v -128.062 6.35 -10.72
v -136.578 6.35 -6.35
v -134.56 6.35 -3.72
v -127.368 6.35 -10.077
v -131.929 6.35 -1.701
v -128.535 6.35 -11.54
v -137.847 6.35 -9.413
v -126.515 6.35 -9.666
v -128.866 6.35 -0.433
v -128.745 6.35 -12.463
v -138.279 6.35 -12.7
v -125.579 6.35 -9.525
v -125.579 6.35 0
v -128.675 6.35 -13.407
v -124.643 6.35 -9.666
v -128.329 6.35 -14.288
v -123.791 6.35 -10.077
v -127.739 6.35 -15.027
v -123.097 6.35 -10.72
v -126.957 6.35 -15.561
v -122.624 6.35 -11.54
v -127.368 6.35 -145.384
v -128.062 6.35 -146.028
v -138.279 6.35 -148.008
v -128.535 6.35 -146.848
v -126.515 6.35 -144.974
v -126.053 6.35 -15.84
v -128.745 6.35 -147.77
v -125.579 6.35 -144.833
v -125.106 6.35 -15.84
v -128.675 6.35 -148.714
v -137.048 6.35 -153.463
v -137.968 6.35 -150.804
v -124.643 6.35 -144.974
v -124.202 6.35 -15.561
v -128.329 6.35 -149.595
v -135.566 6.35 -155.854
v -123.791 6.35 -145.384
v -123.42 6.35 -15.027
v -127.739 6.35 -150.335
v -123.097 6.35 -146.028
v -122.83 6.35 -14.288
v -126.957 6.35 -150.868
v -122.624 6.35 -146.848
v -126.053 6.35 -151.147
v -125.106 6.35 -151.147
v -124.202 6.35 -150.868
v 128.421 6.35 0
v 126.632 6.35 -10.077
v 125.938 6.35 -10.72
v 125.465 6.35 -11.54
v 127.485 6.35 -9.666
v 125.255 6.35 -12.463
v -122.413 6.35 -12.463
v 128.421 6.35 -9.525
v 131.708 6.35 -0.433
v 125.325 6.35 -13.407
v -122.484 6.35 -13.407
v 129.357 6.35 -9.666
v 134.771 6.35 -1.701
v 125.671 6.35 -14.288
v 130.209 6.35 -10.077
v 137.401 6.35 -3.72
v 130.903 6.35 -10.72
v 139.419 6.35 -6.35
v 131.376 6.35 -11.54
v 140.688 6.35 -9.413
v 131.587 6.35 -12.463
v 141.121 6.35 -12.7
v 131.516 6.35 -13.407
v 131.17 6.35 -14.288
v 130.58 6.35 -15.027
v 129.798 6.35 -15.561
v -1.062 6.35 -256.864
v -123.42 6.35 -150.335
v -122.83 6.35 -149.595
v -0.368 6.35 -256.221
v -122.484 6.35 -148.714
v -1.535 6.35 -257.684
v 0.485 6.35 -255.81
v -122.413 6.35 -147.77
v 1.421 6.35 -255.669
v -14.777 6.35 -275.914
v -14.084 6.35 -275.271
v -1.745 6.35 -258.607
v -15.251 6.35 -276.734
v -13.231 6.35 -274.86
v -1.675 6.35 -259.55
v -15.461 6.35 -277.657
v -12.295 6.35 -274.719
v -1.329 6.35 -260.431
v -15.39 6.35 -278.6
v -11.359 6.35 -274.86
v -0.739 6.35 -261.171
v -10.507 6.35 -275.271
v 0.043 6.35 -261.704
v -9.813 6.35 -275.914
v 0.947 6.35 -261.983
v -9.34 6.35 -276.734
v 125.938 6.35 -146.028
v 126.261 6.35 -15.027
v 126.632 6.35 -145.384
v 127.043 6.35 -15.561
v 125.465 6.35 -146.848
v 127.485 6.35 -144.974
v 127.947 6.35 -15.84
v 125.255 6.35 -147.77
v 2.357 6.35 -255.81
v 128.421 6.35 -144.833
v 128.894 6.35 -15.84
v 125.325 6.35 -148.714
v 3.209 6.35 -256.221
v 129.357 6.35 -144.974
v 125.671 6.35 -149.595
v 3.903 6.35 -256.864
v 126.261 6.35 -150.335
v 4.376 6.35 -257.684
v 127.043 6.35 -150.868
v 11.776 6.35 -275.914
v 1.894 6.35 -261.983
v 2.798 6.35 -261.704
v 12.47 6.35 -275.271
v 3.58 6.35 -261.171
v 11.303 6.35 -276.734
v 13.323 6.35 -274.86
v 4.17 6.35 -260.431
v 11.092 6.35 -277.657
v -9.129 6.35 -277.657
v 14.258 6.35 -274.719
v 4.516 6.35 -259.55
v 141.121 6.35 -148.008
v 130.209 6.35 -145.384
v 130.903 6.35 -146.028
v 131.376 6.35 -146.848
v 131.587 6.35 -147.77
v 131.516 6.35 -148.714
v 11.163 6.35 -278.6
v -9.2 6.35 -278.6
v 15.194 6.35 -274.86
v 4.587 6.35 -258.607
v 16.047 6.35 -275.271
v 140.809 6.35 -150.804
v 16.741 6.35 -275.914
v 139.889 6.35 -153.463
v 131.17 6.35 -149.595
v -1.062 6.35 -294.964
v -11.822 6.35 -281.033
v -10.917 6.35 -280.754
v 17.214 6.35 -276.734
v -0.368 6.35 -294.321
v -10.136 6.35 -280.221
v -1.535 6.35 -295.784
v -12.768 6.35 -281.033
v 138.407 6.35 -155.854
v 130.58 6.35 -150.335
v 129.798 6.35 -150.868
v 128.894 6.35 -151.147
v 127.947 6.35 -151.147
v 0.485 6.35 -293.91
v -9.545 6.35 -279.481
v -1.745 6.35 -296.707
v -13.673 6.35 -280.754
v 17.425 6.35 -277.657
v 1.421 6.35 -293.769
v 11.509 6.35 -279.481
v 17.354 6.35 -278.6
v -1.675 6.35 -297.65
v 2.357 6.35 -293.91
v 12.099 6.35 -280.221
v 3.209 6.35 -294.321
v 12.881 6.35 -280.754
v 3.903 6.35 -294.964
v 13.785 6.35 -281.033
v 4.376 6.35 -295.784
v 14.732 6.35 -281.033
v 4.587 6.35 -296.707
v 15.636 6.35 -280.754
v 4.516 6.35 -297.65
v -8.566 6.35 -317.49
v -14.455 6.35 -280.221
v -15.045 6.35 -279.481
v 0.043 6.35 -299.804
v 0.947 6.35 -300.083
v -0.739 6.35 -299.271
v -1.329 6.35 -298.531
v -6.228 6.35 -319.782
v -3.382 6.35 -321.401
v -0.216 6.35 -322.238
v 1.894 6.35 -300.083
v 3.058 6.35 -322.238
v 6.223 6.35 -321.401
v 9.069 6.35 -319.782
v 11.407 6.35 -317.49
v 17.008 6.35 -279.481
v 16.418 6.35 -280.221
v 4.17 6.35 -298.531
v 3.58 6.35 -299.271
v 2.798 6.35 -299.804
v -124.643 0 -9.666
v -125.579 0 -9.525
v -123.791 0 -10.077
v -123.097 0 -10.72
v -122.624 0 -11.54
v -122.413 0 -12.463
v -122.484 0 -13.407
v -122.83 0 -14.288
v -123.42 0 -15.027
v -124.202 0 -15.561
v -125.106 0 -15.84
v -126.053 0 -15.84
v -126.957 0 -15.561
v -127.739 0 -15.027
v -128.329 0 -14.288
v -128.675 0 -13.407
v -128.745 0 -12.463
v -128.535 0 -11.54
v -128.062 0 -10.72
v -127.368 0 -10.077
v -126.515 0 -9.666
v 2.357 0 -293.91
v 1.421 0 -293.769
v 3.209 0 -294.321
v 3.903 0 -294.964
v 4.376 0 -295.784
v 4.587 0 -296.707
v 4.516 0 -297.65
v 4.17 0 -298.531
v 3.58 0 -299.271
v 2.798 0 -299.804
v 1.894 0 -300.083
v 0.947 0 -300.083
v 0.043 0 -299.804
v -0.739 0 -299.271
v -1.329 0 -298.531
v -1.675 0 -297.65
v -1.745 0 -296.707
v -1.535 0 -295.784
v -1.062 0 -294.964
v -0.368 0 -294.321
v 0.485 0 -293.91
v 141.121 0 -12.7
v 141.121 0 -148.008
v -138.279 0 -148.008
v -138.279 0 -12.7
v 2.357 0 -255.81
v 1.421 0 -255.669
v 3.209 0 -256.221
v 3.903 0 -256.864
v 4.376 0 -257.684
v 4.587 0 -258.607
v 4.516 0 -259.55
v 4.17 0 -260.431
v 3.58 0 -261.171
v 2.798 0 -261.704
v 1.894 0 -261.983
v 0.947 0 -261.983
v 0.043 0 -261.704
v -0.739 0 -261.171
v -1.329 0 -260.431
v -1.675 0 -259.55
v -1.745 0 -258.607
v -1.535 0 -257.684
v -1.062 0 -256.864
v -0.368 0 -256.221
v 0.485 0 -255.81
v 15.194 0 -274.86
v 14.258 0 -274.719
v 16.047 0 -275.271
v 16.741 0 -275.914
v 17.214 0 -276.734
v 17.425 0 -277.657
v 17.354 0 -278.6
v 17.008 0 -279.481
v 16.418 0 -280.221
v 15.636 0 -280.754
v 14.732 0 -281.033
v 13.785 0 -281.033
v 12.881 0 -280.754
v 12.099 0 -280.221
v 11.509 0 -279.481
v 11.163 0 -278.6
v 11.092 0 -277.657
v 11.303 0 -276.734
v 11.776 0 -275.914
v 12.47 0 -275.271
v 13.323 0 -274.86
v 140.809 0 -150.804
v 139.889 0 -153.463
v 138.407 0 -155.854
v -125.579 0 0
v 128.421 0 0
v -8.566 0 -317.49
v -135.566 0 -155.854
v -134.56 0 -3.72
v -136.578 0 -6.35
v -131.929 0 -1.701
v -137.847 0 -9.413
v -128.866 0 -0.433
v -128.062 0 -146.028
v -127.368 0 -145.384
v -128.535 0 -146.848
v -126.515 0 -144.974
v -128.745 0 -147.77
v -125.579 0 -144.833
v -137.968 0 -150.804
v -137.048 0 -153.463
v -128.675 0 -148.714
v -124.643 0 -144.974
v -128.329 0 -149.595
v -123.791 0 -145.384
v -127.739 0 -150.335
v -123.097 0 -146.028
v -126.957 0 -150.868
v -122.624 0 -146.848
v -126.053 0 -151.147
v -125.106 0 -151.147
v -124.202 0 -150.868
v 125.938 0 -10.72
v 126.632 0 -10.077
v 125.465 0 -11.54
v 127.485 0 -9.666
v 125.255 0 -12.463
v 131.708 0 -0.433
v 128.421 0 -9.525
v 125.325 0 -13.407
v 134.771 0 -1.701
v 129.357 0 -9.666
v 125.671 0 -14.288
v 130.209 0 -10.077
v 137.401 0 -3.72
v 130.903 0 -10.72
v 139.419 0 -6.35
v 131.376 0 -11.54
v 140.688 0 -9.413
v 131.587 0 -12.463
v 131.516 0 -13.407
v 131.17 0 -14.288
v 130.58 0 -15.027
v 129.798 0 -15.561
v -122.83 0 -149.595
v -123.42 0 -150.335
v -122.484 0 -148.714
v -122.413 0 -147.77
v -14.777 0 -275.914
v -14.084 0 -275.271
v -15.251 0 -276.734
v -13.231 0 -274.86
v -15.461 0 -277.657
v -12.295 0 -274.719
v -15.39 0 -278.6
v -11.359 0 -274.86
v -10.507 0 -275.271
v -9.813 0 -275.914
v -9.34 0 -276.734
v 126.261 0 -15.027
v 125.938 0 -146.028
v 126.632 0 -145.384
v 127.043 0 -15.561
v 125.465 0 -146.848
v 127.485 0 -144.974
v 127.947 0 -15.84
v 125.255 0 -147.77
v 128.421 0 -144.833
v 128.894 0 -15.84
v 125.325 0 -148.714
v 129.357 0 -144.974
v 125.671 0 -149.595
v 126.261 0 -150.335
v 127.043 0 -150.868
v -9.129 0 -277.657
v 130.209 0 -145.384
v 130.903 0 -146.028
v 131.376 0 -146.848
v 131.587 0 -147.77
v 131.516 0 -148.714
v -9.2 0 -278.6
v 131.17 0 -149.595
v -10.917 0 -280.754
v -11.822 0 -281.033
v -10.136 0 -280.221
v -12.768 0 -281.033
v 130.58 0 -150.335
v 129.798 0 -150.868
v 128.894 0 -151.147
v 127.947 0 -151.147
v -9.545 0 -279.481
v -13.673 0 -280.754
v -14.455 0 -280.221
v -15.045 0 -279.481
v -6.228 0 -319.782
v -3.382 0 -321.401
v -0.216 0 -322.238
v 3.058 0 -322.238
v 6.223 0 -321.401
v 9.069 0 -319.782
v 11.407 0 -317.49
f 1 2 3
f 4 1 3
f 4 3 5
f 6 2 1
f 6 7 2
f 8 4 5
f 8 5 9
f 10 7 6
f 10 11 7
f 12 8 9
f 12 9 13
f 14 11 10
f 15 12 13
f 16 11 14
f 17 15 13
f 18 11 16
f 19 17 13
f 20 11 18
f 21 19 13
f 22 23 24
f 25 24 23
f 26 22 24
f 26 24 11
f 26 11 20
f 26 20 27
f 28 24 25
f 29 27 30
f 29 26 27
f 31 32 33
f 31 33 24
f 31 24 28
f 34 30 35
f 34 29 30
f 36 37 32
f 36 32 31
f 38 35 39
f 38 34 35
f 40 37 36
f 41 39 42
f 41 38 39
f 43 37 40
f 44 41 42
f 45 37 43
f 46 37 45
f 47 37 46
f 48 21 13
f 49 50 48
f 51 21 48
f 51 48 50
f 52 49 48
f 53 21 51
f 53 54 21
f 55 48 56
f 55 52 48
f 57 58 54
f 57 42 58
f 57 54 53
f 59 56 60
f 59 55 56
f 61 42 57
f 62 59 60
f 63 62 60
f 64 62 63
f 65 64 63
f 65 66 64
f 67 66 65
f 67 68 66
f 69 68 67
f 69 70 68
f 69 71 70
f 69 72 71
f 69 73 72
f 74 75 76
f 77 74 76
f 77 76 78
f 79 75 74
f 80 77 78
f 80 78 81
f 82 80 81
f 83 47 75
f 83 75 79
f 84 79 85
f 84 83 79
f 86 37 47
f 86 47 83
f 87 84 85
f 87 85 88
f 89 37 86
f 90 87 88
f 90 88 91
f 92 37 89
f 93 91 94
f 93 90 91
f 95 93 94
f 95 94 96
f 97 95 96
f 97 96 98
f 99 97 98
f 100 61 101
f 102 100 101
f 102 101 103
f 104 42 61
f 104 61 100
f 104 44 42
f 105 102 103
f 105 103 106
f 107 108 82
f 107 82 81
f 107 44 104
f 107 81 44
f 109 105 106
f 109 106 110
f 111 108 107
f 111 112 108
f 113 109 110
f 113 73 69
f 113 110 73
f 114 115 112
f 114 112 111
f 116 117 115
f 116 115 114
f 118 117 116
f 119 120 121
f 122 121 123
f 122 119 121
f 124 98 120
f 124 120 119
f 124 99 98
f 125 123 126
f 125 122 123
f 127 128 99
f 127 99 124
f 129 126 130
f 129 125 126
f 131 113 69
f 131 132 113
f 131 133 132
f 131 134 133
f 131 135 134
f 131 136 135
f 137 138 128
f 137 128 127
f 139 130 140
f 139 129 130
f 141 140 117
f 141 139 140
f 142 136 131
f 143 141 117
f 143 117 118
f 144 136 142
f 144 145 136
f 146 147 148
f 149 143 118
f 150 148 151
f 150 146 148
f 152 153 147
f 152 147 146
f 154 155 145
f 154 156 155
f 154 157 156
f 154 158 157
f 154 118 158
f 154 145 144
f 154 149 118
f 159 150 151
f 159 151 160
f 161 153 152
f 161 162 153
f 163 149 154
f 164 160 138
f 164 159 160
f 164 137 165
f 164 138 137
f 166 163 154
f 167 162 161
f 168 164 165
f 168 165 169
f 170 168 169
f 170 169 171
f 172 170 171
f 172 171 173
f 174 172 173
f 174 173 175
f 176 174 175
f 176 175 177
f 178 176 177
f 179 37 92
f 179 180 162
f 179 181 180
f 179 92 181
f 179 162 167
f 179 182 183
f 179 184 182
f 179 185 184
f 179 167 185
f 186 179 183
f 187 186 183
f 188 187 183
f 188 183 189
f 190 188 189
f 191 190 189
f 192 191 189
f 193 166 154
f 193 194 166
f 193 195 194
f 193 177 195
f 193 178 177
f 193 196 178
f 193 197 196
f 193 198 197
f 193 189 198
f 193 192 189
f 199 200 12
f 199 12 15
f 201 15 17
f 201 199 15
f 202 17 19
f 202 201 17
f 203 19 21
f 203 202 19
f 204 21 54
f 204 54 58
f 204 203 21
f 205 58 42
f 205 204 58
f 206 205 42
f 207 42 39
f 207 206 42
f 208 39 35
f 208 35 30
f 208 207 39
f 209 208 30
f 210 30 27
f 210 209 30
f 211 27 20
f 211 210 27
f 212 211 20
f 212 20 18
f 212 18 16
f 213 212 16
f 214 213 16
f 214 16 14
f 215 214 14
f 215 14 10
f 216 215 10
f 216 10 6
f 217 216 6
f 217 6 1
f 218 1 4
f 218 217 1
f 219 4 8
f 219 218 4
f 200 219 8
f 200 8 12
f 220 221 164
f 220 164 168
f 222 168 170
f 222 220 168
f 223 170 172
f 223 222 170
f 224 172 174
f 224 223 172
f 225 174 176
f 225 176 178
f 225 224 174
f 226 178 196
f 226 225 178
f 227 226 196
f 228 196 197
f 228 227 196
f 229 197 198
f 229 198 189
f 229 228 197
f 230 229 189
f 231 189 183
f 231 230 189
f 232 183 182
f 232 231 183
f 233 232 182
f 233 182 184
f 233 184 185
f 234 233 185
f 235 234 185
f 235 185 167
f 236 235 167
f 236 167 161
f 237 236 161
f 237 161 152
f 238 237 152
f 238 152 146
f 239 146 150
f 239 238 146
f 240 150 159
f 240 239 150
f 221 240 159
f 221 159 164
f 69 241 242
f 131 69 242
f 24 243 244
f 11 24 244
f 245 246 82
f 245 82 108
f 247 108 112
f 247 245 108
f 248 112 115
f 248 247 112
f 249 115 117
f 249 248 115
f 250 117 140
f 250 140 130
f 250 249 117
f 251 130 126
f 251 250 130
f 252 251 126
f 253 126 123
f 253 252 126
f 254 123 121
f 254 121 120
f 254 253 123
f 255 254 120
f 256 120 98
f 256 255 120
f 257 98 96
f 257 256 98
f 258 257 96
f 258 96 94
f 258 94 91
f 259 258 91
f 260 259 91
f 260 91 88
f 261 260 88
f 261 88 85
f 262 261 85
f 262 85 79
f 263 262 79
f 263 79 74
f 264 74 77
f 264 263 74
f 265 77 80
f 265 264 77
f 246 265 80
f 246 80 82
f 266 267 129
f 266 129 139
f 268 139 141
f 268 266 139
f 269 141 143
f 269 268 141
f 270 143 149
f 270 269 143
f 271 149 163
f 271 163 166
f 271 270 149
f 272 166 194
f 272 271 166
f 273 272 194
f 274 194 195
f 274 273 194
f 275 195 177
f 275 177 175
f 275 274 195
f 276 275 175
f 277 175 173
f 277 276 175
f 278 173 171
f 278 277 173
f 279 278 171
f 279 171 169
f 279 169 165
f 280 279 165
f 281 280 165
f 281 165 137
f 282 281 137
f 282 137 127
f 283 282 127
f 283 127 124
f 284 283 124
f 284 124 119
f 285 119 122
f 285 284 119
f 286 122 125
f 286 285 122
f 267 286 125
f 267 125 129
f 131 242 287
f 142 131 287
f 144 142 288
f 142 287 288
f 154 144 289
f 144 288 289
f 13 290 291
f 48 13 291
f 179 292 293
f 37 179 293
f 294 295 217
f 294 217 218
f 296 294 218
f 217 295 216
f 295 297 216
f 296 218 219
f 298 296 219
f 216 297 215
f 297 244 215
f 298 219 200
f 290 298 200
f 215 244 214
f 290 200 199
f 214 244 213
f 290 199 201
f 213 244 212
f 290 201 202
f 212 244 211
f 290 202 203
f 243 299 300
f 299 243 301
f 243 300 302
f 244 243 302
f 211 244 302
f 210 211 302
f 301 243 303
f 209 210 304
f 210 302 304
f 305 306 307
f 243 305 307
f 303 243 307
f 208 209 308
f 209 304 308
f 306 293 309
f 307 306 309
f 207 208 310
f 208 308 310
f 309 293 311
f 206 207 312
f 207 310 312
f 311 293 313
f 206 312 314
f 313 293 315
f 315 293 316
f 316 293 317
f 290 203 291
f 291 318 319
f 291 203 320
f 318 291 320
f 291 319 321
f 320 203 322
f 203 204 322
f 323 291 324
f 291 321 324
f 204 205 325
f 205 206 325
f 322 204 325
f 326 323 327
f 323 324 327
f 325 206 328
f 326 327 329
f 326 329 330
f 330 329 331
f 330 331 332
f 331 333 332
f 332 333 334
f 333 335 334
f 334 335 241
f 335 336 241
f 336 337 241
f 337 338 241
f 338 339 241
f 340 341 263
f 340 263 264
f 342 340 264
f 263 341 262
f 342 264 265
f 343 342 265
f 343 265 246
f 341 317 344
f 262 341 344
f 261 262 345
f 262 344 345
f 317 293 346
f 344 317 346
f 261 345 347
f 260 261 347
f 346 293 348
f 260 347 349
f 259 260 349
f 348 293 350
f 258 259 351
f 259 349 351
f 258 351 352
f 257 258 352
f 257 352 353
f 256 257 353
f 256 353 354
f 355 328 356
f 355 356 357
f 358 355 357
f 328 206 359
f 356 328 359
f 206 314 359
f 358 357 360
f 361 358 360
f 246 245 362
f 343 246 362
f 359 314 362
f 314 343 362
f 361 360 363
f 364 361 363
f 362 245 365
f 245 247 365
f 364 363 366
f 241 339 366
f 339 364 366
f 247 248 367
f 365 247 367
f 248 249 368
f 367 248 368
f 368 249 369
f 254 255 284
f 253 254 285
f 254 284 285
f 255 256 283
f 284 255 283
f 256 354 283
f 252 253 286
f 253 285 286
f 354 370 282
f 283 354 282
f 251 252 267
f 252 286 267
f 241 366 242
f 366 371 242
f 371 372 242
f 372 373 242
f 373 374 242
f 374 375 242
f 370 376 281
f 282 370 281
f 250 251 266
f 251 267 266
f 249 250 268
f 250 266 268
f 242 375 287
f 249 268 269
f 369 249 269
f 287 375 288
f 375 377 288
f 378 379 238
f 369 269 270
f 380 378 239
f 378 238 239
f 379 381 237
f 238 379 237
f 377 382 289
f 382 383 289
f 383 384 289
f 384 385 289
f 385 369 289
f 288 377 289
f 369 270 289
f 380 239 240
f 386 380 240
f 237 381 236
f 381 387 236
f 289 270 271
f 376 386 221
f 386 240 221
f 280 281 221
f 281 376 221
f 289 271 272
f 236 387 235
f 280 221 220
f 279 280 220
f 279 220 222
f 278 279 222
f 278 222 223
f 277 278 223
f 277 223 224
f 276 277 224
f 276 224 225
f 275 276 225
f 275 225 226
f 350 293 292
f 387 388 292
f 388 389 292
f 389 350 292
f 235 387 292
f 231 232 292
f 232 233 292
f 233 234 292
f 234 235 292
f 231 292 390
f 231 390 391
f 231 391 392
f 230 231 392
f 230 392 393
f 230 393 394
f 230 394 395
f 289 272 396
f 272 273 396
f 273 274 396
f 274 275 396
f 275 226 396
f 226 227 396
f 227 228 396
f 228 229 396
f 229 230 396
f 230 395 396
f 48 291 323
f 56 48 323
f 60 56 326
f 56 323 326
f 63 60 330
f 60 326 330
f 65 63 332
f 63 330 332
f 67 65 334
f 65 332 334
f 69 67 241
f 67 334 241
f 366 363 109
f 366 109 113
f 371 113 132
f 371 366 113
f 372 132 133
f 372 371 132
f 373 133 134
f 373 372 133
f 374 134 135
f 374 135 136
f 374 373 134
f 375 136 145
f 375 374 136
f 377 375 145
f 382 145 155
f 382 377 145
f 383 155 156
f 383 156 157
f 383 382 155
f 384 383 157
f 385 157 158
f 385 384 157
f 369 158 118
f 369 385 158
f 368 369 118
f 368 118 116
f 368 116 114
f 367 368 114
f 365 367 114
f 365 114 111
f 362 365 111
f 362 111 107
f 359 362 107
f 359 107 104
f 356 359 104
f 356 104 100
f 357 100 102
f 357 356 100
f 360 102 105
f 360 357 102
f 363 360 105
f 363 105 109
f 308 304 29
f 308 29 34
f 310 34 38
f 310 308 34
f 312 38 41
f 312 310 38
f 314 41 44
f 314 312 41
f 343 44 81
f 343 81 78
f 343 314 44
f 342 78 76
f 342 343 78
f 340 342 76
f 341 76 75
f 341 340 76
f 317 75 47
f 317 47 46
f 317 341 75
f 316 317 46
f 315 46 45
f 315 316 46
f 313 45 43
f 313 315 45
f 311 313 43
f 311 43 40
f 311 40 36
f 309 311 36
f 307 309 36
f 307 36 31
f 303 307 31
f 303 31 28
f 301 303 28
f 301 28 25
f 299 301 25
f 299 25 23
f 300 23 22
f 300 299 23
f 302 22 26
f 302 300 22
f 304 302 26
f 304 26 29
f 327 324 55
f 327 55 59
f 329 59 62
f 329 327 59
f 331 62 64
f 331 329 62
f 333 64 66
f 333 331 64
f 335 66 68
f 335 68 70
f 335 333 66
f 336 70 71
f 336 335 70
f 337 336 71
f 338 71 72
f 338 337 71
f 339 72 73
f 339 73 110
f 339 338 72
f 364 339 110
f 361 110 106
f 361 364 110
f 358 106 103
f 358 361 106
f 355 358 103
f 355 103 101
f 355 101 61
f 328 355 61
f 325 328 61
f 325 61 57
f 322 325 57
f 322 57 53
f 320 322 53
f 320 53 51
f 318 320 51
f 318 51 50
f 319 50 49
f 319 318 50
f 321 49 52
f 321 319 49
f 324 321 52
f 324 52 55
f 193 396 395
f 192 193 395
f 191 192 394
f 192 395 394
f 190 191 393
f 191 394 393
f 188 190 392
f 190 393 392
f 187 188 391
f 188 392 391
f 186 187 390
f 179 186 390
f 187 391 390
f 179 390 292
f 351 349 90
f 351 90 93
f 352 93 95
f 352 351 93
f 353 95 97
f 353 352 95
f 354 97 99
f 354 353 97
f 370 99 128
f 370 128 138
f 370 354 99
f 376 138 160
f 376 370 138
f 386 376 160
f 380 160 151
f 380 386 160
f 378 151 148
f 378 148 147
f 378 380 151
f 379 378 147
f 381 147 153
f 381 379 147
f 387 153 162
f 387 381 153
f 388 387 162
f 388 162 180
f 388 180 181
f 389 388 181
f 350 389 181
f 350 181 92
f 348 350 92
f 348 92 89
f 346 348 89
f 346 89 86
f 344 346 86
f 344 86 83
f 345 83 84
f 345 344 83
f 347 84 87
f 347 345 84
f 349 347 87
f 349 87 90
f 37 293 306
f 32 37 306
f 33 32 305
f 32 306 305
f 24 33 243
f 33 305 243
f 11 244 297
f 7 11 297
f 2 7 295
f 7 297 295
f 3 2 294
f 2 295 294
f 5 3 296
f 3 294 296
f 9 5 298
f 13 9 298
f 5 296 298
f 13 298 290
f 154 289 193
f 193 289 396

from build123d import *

# Parameters (mm, degrees)
SKETCH1_R           = 3.175
BOSS_EXTRUDE2_DEPTH = 6.35


with BuildPart() as part:
    # Sketch1 → Boss-Extrude2 (new body)
    with BuildSketch(Plane(origin=(0, 0, 0), x_dir=(1, 0, 0), z_dir=(0, 1, 0))):
        with BuildLine():
            Line((-125.579322034, 0), (128.420677966, 0))
            ThreePointArc((128.420677966, 0), (137.400934087, 3.719743879), (141.120677966, 12.7))
            Line((141.120677966, 12.7), (141.120677966, 148.007538959))
            ThreePointArc((141.120677966, 148.007538959), (140.423079494, 152.158726448), (138.406920869, 155.853872669))
            Line((138.406920869, 155.853872669), (11.406920869, 317.490236305))
            ThreePointArc((11.406920869, 317.490236305), (1.420677966, 322.343902596), (-8.565564937, 317.490236305))
            Line((-8.565564937, 317.490236305), (-135.565564937, 155.853872669))
            ThreePointArc((-135.565564937, 155.853872669), (-137.581723562, 152.158726448), (-138.279322034, 148.007538959))
            Line((-138.279322034, 148.007538959), (-138.279322034, 12.7))
            ThreePointArc((-138.279322034, 12.7), (-134.559578155, 3.719743879), (-125.579322034, 0))
        make_face()
        with Locations(Location((1.420677966, 296.943902596, 0), (0, 0, 270))):
            Circle(SKETCH1_R, mode=Mode.SUBTRACT)
        with Locations(Location((-12.295062697, 277.893902596, 0), (0, 0, 270))):
            Circle(SKETCH1_R, mode=Mode.SUBTRACT)
        with Locations(Location((14.258408226, 277.893902596, 0), (0, 0, 270))):
            Circle(SKETCH1_R, mode=Mode.SUBTRACT)
        with Locations(Location((1.420677966, 258.843902596, 0), (0, 0, 270))):
            Circle(SKETCH1_R, mode=Mode.SUBTRACT)
        with Locations(Location((-125.579322034, 148.007538959, 0), (0, 0, 270))):
            Circle(SKETCH1_R, mode=Mode.SUBTRACT)
        with Locations(Location((128.420677966, 148.007538959, 0), (0, 0, 270))):
            Circle(SKETCH1_R, mode=Mode.SUBTRACT)
        with Locations(Location((128.420677966, 12.7, 0), (0, 0, 270))):
            Circle(SKETCH1_R, mode=Mode.SUBTRACT)
        with Locations(Location((-125.579322034, 12.7, 0), (0, 0, 270))):
            Circle(SKETCH1_R, mode=Mode.SUBTRACT)
    extrude(amount=BOSS_EXTRUDE2_DEPTH)


solid = part.part
